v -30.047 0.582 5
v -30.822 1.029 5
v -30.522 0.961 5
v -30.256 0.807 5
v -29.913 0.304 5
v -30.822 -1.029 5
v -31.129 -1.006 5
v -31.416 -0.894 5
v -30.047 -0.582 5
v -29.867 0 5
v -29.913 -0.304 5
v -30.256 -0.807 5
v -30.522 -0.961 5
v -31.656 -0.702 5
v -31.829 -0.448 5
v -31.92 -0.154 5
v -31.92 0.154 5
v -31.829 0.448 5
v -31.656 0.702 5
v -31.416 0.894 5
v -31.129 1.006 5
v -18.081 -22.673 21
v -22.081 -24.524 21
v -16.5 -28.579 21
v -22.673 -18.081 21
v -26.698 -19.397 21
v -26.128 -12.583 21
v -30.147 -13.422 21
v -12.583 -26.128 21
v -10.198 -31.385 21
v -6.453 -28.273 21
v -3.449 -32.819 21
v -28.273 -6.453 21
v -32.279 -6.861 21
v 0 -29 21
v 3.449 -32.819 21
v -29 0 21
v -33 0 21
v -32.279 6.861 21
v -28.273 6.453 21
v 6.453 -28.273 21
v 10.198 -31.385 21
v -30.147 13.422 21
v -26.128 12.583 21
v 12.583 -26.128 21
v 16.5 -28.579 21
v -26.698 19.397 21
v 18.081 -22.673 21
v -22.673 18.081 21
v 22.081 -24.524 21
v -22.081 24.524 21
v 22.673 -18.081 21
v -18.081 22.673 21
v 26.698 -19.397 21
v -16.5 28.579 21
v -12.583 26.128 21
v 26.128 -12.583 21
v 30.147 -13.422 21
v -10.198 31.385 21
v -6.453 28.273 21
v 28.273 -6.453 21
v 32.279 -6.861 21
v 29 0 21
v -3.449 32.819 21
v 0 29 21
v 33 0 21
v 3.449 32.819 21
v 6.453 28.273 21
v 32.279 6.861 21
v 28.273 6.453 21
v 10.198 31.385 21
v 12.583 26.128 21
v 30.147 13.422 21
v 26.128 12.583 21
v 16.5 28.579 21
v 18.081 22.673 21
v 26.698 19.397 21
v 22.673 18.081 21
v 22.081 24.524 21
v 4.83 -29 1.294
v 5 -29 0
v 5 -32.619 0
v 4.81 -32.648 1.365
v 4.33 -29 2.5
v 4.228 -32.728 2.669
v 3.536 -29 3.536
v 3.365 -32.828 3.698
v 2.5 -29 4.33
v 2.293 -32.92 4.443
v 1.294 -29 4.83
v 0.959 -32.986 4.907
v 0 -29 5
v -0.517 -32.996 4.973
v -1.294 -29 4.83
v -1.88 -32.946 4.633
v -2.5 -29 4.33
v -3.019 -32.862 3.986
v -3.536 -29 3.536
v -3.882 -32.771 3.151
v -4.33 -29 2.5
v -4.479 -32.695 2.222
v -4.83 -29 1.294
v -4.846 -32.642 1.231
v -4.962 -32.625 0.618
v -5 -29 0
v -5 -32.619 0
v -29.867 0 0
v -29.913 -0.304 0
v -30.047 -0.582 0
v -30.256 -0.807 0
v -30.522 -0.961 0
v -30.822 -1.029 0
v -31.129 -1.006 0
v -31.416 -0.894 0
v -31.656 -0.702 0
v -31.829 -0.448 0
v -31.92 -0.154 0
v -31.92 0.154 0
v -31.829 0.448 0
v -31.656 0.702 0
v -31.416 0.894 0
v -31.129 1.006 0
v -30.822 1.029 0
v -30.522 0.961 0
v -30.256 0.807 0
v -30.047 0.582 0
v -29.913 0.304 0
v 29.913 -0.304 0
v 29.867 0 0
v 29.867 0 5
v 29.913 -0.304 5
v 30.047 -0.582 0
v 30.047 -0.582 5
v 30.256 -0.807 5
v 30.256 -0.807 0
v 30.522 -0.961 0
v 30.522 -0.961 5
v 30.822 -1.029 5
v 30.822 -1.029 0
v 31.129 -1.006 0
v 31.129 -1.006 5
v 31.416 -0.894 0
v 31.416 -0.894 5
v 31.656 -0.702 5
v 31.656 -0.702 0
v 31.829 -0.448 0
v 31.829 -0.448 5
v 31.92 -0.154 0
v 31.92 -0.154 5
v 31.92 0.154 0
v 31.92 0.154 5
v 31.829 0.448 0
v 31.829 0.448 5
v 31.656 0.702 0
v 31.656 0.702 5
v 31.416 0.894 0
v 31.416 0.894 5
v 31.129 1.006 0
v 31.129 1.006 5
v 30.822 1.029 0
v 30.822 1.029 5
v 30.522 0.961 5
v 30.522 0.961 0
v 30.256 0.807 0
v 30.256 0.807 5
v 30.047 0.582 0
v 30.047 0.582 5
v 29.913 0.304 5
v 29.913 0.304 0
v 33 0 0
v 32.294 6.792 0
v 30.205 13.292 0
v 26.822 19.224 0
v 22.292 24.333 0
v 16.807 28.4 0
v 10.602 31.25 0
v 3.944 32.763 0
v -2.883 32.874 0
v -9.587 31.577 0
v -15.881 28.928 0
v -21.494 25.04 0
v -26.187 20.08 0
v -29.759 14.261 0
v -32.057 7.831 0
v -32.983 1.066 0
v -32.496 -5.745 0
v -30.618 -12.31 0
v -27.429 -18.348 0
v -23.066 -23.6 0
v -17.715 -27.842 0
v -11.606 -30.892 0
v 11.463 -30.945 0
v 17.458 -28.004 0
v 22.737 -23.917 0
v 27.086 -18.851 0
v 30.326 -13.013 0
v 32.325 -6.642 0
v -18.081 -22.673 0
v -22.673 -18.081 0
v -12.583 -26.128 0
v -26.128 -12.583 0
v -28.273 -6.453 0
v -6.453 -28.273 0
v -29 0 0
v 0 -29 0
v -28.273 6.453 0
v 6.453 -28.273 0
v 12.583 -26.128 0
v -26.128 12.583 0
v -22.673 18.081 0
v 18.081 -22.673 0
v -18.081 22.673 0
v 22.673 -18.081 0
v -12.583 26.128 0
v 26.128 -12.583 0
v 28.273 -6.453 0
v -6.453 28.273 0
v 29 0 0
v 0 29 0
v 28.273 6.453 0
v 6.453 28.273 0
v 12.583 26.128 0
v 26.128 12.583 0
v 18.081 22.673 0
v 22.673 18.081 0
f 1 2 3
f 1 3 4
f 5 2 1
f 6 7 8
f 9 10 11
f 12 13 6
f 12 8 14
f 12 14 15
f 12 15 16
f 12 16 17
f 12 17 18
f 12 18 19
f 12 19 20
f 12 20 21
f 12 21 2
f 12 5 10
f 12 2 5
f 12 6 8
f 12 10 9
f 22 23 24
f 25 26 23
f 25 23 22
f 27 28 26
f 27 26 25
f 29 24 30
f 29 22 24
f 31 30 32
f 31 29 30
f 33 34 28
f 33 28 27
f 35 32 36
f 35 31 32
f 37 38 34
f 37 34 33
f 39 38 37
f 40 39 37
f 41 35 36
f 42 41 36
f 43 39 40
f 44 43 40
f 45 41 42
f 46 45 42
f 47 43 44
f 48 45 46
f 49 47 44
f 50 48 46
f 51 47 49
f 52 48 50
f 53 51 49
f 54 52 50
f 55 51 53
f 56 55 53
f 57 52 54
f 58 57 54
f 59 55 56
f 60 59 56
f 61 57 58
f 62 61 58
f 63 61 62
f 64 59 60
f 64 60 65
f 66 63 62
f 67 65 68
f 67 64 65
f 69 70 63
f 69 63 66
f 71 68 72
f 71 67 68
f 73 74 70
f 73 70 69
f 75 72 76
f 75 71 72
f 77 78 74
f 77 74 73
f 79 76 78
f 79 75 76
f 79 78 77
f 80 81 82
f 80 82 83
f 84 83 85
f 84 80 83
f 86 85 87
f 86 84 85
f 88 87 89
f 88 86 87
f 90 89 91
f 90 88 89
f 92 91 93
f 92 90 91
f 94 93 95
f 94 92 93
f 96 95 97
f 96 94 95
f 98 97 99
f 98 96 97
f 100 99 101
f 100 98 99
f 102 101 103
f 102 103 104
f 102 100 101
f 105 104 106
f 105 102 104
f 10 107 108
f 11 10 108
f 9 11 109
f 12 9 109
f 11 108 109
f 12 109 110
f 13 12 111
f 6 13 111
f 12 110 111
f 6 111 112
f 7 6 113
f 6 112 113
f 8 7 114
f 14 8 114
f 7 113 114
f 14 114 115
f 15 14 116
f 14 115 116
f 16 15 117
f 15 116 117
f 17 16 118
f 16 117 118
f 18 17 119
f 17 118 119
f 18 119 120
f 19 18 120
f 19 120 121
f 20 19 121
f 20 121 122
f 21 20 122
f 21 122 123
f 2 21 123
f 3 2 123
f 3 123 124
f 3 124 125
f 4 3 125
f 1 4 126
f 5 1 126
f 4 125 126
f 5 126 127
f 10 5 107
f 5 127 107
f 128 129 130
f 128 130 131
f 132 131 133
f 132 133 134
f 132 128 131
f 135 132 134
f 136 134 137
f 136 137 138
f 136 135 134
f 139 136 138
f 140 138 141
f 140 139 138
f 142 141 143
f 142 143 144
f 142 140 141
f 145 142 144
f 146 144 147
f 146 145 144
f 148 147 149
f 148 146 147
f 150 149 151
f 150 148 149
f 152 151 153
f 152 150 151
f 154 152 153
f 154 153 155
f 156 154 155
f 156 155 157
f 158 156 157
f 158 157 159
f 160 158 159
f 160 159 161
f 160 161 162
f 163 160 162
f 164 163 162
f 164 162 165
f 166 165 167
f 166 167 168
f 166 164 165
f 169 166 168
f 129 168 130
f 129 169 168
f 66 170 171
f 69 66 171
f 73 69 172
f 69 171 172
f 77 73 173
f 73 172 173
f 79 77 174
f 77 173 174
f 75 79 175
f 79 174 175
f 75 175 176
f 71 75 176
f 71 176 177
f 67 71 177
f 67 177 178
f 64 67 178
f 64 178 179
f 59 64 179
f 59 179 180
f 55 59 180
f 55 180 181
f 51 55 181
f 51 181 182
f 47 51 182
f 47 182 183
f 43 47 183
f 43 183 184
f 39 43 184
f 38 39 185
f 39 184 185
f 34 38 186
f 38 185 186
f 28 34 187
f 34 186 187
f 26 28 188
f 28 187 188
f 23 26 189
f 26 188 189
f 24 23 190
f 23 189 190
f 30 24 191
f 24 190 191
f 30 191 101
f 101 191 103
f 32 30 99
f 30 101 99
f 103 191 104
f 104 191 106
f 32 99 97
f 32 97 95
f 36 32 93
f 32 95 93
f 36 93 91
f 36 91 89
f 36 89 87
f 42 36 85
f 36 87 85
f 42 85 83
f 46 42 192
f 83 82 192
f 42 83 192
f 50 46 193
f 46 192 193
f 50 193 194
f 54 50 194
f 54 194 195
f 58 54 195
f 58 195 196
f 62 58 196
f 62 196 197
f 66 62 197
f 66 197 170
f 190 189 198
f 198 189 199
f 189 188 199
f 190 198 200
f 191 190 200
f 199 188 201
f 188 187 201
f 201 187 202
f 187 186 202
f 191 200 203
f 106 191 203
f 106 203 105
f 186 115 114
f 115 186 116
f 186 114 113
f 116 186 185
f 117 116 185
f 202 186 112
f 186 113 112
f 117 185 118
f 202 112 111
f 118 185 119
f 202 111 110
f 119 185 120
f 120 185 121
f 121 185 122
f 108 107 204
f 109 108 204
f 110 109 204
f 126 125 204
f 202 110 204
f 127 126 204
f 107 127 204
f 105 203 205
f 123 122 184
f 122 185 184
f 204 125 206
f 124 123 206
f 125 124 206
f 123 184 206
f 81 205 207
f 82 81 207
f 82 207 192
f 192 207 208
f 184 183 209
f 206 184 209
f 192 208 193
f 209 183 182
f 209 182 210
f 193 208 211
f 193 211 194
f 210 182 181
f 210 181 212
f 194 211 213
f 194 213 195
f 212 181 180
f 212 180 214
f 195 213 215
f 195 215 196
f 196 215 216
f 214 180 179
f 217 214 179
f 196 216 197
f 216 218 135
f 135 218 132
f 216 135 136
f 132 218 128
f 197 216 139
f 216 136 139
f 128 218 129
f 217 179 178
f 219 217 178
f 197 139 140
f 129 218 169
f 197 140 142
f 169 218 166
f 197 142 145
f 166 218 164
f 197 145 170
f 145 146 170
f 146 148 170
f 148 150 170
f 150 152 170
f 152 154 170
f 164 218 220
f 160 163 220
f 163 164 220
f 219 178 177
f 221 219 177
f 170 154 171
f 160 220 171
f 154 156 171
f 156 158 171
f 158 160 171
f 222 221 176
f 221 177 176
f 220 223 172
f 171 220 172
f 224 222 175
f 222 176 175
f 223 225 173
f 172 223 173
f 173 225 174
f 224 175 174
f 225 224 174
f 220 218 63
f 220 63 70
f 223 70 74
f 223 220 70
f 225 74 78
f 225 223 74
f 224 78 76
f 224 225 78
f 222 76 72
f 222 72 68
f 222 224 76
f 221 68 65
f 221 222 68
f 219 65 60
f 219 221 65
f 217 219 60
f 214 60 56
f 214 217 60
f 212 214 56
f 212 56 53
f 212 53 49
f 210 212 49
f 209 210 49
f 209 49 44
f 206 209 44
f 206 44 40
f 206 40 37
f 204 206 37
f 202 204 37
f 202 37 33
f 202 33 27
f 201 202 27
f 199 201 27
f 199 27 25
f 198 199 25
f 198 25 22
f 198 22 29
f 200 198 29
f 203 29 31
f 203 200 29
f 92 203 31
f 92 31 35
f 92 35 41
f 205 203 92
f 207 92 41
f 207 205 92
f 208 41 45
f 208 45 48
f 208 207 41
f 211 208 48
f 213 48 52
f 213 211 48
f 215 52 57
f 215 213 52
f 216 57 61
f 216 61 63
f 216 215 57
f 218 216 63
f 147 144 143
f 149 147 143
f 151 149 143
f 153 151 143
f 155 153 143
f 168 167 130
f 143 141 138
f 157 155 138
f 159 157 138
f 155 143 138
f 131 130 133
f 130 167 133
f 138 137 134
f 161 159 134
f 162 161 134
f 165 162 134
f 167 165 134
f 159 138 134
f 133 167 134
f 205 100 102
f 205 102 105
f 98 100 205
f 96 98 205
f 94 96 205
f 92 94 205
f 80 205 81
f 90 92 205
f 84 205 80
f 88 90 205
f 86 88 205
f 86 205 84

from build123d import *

# Parameters (mm, degrees)
CYLINDER_R     = 5
CYLINDER_DEPTH = 10
TUBE_R         = 33
TUBE_R_2       = 29
TUBE_DEPTH     = 21
SKETCH001_R    = 1.032289
POCKET_DEPTH   = 5


with BuildPart() as cylinder:
    # Cylinder → Cylinder (new body)
    with BuildSketch(Plane.XZ.offset(29)):
        Circle(CYLINDER_R)
    extrude(amount=CYLINDER_DEPTH)


with BuildPart() as body004:
    # Tube → Tube (new body)
    with BuildSketch(Plane.XY):
        Circle(TUBE_R)
        Circle(TUBE_R_2, mode=Mode.SUBTRACT)
    extrude(amount=TUBE_DEPTH)

    # Cut: cut Cylinder
    add(cylinder.part, mode=Mode.SUBTRACT)

    # Sketch001 (on DatumPlane) → Pocket (cut)
    with BuildSketch(Plane(origin=(0, 0, 0), x_dir=(1, 0, 0), z_dir=(0, 0, -1))):
        with Locations((-30.899429, 0)):
            Circle(SKETCH001_R)
    pocket = extrude(amount=-POCKET_DEPTH, mode=Mode.SUBTRACT)

    # Mirrored: Pocket across Sketch001 V_Axis
    add(pocket.mirror(Plane(origin=(0, 0, 0), x_dir=(0, 0, -1), z_dir=(1, 0, 0))), mode=Mode.SUBTRACT)


solid = body004.part
